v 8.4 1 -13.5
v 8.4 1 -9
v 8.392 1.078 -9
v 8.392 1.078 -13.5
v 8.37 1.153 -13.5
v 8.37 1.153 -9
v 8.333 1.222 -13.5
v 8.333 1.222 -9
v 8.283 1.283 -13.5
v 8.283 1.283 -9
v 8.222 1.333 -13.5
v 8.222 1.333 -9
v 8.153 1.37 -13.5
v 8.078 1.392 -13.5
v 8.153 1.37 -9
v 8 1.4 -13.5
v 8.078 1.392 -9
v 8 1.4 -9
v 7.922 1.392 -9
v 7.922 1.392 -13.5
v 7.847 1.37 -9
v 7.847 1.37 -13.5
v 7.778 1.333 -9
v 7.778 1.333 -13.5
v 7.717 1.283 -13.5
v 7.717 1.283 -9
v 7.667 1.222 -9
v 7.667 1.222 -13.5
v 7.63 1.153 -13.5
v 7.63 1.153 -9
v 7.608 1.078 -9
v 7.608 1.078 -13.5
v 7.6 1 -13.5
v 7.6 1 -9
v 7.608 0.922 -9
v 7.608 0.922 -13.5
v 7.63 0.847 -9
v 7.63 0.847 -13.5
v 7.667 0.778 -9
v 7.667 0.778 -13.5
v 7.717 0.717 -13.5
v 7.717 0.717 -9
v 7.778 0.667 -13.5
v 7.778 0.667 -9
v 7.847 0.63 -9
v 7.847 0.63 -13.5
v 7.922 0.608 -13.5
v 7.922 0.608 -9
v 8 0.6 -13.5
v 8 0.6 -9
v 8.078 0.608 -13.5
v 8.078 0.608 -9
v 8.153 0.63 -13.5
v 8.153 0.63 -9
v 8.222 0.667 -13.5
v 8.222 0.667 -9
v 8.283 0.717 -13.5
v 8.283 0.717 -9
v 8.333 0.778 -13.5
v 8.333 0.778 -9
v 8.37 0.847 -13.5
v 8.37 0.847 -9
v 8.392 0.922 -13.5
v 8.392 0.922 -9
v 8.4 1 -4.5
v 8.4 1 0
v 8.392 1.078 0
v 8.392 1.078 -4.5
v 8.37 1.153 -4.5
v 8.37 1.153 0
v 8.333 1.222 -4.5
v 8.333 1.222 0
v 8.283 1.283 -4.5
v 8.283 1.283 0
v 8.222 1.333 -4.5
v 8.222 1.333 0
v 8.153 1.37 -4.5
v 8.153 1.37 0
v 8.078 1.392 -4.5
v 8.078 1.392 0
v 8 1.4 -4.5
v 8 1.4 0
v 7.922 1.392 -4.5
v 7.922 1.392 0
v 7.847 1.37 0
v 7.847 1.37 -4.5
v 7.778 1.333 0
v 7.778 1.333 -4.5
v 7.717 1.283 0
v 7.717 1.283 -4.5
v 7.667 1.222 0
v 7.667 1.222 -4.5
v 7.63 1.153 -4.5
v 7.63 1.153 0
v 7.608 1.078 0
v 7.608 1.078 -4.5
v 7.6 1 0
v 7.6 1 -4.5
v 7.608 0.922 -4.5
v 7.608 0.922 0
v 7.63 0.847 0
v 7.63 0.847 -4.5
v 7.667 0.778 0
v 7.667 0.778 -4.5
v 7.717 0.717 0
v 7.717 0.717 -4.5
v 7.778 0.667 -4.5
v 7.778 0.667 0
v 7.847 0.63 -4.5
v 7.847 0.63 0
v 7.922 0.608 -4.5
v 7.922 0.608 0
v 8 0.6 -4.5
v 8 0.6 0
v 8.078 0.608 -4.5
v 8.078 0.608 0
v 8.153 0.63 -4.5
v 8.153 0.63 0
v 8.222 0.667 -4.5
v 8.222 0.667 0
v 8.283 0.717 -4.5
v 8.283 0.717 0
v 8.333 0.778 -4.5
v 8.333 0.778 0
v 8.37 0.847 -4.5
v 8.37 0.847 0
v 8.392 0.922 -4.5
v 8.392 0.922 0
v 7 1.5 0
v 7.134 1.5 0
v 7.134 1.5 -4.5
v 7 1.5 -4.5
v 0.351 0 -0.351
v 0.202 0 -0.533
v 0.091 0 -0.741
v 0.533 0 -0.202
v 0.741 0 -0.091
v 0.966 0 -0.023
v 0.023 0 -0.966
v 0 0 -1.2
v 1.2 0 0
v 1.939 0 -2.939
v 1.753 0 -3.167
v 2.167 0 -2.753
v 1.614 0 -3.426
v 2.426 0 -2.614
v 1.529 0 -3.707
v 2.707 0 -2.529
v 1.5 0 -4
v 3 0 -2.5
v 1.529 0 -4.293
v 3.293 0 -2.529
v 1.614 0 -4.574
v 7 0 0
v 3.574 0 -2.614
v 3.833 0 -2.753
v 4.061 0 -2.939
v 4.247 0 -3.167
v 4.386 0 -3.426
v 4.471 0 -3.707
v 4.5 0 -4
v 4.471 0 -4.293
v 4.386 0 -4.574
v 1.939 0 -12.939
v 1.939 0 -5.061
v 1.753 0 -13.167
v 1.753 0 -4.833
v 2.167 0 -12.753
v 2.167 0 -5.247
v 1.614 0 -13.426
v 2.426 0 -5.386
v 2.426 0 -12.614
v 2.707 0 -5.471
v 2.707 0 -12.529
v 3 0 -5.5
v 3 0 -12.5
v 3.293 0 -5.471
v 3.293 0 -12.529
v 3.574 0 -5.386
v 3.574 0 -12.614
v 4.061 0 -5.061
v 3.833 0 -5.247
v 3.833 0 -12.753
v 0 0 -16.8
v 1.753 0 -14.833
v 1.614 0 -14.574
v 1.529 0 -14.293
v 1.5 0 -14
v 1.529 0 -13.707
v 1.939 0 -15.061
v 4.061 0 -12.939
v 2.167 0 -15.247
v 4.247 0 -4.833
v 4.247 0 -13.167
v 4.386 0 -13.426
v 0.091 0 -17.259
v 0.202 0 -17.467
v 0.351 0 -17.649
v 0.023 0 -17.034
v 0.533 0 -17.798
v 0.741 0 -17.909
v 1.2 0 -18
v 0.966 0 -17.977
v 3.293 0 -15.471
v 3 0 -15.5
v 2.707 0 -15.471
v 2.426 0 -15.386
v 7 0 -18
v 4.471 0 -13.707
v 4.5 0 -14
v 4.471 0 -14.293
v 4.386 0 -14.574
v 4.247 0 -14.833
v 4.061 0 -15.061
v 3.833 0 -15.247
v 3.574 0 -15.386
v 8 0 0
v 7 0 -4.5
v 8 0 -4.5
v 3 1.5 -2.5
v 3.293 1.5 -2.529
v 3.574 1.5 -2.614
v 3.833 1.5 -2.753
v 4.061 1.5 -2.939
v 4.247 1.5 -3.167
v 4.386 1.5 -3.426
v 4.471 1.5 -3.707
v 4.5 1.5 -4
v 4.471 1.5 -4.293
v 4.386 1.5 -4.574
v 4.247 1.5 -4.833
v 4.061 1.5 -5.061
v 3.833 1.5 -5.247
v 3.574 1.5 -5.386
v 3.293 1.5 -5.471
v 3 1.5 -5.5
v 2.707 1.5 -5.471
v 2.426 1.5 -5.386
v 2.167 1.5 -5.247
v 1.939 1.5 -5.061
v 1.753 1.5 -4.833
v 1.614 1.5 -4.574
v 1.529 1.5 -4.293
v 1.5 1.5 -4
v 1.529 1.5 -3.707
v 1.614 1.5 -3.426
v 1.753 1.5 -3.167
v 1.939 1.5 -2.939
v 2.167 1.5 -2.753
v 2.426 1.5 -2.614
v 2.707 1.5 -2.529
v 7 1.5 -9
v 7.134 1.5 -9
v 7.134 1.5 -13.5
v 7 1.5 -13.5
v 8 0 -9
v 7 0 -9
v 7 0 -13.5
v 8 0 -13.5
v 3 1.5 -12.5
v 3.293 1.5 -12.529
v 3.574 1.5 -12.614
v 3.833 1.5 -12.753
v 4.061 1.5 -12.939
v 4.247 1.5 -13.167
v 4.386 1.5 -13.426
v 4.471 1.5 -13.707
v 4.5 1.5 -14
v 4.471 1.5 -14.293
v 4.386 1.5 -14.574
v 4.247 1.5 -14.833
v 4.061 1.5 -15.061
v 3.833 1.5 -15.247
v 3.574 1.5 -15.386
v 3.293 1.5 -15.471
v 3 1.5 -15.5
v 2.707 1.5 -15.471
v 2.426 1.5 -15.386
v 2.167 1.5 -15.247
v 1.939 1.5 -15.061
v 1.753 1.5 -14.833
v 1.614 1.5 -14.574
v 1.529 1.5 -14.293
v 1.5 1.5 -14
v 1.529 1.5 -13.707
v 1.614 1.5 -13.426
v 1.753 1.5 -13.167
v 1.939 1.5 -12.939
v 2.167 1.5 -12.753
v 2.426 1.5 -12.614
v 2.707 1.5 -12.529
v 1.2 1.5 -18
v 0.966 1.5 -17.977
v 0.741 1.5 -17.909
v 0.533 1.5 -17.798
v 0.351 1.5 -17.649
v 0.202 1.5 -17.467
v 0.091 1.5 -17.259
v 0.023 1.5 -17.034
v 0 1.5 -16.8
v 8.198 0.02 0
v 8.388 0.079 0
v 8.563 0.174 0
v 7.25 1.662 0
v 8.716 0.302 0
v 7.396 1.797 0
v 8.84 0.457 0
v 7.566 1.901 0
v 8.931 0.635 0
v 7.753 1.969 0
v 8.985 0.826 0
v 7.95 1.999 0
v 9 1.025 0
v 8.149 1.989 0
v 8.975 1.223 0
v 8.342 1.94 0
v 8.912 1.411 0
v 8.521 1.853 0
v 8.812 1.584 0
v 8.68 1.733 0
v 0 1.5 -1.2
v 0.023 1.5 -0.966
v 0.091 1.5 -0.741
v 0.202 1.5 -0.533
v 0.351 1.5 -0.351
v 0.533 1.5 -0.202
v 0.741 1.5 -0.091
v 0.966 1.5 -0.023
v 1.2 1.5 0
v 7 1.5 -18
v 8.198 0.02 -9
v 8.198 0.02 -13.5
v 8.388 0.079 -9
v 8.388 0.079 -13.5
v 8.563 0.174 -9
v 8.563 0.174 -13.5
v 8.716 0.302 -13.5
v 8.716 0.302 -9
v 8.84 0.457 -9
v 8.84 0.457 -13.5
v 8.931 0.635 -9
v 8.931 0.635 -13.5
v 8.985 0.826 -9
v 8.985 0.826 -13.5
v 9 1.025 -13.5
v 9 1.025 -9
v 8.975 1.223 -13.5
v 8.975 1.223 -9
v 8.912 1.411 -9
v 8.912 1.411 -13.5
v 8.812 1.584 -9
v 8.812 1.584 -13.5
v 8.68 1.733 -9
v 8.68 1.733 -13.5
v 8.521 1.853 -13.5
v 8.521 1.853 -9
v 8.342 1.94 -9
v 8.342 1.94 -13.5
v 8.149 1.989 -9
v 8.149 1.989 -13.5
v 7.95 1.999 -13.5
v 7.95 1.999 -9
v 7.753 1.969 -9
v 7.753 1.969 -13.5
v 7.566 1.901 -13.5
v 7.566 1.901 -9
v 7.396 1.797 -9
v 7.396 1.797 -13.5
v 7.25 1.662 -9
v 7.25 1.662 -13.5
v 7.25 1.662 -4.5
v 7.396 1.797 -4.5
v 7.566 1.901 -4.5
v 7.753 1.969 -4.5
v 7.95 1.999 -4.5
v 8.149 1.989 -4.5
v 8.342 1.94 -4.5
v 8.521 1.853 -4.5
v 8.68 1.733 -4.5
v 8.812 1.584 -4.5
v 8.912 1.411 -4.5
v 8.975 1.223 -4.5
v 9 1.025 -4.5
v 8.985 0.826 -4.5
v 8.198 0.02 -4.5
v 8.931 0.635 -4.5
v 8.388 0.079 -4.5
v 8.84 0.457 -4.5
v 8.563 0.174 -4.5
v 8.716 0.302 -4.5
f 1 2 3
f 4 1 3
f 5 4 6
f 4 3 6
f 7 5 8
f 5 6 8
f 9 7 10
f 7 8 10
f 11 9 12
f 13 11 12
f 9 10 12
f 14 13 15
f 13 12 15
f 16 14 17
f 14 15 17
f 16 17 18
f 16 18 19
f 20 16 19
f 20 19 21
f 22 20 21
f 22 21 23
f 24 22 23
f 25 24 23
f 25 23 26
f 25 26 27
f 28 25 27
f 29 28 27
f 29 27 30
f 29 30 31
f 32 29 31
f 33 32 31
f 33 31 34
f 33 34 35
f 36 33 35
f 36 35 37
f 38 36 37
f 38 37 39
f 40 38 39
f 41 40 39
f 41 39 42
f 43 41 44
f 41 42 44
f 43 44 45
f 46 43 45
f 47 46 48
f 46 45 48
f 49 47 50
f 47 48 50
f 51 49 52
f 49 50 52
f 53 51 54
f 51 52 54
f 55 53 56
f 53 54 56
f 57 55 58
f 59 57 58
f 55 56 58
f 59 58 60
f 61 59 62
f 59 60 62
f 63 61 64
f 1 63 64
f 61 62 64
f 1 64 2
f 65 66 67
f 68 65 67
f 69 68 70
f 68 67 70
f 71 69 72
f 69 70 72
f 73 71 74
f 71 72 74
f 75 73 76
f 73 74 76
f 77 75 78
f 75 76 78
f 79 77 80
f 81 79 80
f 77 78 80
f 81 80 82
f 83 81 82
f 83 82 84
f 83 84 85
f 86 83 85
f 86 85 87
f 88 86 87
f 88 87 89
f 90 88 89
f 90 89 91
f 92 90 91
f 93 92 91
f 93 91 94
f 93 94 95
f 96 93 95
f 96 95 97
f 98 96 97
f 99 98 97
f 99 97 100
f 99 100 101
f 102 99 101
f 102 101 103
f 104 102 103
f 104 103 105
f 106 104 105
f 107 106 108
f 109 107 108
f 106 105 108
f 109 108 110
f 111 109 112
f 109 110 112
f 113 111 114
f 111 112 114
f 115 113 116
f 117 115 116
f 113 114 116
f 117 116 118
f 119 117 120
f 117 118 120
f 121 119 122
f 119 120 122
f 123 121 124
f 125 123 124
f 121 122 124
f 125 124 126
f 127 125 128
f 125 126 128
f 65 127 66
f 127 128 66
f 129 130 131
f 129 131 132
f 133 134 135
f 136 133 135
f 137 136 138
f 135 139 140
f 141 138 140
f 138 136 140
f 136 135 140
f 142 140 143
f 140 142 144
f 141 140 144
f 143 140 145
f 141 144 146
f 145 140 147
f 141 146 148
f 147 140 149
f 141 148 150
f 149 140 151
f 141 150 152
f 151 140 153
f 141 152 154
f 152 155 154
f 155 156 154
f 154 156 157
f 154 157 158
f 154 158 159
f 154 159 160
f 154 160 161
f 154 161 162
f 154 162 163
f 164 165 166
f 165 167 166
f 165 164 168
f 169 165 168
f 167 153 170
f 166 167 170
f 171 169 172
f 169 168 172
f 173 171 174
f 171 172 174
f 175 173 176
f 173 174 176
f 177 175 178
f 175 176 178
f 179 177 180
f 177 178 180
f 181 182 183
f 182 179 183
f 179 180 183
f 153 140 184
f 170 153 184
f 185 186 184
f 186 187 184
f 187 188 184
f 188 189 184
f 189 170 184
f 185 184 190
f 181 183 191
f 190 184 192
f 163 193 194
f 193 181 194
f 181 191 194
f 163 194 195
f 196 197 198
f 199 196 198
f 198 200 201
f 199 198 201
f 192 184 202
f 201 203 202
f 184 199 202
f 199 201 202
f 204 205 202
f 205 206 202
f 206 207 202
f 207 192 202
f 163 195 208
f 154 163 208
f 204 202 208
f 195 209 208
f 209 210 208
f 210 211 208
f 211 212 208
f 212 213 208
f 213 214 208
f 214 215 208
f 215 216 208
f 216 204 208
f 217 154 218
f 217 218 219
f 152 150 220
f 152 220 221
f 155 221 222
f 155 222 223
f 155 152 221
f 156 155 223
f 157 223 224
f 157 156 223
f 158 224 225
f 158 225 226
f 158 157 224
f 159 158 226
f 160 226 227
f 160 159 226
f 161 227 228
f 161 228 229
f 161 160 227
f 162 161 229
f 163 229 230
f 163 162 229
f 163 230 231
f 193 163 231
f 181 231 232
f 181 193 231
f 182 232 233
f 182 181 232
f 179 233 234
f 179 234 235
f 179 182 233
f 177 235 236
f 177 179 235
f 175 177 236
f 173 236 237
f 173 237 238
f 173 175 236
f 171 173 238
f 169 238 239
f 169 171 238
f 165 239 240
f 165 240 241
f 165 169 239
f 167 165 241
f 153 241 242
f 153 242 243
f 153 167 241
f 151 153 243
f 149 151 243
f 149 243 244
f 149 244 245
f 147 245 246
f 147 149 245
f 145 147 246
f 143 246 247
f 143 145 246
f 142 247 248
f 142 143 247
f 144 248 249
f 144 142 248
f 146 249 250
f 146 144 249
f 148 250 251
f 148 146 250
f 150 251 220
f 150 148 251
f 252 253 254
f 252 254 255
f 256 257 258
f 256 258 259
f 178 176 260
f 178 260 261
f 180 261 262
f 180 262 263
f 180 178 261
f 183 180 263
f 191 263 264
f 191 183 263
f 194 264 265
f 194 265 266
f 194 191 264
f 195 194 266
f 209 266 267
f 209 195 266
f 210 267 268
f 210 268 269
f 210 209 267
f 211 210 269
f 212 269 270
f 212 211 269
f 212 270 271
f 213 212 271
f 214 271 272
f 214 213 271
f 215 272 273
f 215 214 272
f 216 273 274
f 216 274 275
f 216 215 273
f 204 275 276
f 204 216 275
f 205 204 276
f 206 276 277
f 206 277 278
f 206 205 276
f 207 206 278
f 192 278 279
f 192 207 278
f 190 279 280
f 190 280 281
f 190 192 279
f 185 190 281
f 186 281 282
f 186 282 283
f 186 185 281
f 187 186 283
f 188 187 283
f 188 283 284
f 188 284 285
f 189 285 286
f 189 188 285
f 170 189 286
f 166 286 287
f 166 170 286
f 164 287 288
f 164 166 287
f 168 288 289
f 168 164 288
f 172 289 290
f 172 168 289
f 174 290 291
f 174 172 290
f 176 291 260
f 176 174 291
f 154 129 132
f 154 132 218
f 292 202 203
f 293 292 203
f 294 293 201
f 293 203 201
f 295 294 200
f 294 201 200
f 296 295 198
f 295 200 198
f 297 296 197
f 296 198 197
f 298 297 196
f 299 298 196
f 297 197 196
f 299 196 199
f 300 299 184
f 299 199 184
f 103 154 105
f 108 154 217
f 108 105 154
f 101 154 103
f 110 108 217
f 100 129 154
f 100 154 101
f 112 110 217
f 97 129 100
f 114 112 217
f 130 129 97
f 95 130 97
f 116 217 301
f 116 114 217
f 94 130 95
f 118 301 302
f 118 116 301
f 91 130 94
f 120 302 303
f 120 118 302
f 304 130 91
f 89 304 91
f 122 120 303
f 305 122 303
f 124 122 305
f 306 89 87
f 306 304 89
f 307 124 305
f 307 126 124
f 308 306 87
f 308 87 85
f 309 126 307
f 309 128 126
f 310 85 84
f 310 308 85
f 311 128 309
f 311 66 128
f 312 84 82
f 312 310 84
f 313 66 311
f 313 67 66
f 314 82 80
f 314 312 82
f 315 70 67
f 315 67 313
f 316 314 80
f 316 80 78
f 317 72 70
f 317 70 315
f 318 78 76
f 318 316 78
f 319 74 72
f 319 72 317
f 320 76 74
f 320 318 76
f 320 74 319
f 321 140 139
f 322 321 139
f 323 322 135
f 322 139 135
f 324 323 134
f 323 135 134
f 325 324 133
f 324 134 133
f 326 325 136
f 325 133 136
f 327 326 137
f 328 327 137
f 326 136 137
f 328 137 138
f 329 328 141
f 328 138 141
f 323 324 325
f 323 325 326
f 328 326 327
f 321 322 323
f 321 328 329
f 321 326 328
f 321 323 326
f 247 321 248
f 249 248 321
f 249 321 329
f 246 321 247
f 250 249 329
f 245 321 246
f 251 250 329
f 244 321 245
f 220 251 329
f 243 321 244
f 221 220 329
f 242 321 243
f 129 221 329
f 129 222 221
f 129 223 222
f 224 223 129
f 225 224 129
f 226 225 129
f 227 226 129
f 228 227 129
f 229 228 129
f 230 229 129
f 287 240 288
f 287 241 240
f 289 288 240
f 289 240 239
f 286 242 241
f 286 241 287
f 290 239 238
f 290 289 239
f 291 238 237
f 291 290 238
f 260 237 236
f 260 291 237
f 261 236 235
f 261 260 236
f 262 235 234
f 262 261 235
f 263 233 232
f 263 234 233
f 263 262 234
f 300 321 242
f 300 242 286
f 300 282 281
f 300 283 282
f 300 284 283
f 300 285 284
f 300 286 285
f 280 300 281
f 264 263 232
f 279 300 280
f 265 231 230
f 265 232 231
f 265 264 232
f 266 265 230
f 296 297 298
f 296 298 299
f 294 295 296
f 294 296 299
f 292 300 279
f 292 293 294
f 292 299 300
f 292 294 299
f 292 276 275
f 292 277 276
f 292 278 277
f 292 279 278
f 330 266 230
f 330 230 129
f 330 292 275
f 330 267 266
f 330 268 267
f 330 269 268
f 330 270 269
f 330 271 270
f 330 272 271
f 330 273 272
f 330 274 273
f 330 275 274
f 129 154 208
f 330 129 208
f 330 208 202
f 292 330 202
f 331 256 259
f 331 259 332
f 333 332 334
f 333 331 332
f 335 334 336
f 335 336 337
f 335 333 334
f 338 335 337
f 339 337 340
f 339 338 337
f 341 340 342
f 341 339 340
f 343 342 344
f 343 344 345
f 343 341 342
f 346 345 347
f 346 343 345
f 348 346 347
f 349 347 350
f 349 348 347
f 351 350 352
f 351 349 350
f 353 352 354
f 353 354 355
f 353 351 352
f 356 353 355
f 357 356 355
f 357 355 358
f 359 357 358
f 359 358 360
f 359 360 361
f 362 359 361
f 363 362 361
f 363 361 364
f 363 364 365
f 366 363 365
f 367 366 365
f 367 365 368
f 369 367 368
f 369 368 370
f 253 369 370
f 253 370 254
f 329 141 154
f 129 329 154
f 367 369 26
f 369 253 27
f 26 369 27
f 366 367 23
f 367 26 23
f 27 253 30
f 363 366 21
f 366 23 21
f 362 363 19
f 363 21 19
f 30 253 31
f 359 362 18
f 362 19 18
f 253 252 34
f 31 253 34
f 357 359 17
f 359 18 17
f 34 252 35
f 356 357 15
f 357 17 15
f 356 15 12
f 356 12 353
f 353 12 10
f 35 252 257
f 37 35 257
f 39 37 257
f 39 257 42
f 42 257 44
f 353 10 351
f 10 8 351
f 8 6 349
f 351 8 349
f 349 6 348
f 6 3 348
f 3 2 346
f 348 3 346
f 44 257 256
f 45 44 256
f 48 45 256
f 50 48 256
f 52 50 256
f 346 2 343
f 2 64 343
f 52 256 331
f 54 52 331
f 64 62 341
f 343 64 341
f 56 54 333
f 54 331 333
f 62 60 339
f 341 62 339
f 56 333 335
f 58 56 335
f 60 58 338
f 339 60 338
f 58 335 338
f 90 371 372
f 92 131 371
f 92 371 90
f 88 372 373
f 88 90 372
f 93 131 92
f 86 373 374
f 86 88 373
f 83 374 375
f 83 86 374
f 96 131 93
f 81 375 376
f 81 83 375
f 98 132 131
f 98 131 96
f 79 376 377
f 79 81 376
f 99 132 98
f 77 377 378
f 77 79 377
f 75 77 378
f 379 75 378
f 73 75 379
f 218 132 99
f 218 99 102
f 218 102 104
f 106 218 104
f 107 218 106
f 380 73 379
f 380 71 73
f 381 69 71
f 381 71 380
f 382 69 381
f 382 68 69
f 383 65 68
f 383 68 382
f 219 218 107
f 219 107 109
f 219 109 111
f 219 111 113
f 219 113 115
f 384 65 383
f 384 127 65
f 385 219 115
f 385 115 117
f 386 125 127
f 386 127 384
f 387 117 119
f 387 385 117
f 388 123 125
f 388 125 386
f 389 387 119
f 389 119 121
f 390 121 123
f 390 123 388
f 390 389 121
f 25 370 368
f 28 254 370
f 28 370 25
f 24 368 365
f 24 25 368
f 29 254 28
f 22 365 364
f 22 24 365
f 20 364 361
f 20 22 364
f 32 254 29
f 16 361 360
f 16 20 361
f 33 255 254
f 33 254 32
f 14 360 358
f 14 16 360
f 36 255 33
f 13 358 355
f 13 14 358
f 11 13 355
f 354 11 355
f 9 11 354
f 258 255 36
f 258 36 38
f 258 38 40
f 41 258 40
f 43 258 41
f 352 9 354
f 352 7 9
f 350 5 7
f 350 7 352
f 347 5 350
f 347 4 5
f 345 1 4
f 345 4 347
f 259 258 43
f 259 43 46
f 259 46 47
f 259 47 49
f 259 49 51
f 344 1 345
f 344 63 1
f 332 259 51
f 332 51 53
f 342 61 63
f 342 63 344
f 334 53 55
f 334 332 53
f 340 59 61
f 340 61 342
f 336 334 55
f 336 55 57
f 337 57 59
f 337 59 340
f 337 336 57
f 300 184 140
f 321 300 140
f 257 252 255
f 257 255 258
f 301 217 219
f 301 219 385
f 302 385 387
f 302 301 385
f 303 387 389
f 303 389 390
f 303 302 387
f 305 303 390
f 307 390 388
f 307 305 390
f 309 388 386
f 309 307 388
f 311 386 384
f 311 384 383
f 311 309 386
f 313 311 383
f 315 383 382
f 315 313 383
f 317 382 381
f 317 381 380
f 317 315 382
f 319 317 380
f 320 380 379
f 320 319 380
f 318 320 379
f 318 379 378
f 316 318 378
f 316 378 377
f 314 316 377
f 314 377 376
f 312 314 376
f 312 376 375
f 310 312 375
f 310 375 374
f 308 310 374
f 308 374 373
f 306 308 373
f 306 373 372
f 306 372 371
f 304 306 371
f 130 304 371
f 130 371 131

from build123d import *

# Parameters (mm, degrees)
SKETCH_1_R          = 1.5
EXTRUDE_1_DEPTH     = 1.5
SKETCH2_R           = 0.4
BOSS_EXTRUDE3_DEPTH = 18
SKETCH3_W           = 2
SKETCH3_H           = 4.5
CUT_EXTRUDE2_DEPTH  = 20


with BuildPart() as part:
    # Эскиз1 → Бобышка-Вытянуть1 (new body)
    with BuildSketch(Plane(origin=(0, 0, 0), x_dir=(1, 0, 0), z_dir=(0, 1, 0))):
        with BuildLine():
            Line((0, 16.8), (0, 1.2))
            ThreePointArc((0, 1.2), (0.351471863, 0.351471863), (1.2, 0))
            Line((1.2, 0), (7, 0))
            Line((7, 0), (7, 4.5))
            Line((7, 4.5), (7, 9))
            Line((7, 9), (7, 13.5))
            Line((7, 13.5), (7, 18))
            Line((7, 18), (1.2, 18))
            ThreePointArc((1.2, 18), (0.351471863, 17.648528137), (0, 16.8))
        make_face()
        with Locations(Location((3, 4, 0), (0, 0, 270))):
            Circle(SKETCH_1_R, mode=Mode.SUBTRACT)
        with Locations(Location((3, 14, 0), (0, 0, 270))):
            Circle(SKETCH_1_R, mode=Mode.SUBTRACT)
    extrude(amount=EXTRUDE_1_DEPTH)


with BuildPart() as body_2:
    # Sketch2 → Boss-Extrude3 (new body)
    with BuildSketch(Plane.XY):
        with BuildLine():
            Line((7, 0), (8, 0))
            ThreePointArc((8, 0), (8.866025404, 1.5), (7.133974596, 1.5))
            Line((7.133974596, 1.5), (7, 1.5))
            Line((7, 1.5), (7, 0))
        make_face()
        with Locations((8, 1)):
            Circle(SKETCH2_R, mode=Mode.SUBTRACT)
    extrude(amount=-BOSS_EXTRUDE3_DEPTH)

    # Sketch3 → Cut-Extrude2 (cut)
    with BuildSketch(Plane.XZ):
        with Locations((8, -6.75)):
            Rectangle(SKETCH3_W, SKETCH3_H)
        with Locations((8, -15.75)):
            Rectangle(SKETCH3_W, SKETCH3_H)
    extrude(amount=-CUT_EXTRUDE2_DEPTH, mode=Mode.SUBTRACT)


with BuildPart() as cut_extrude2_piece_1:
    # of the separate pieces the step leaves, piece 1, a body of its own (cut_extrude2_pieces)
    add(body_2.part.solids().sort_by_distance((8, 0, 0))[0])


with BuildPart() as cut_extrude2_piece_2:
    # of the separate pieces the step leaves, piece 2, a body of its own (cut_extrude2_pieces)
    add(body_2.part.solids().sort_by_distance((7.133974596, 1.5, -9))[0])


solid = Compound([part.part, cut_extrude2_piece_1.part, cut_extrude2_piece_2.part])
